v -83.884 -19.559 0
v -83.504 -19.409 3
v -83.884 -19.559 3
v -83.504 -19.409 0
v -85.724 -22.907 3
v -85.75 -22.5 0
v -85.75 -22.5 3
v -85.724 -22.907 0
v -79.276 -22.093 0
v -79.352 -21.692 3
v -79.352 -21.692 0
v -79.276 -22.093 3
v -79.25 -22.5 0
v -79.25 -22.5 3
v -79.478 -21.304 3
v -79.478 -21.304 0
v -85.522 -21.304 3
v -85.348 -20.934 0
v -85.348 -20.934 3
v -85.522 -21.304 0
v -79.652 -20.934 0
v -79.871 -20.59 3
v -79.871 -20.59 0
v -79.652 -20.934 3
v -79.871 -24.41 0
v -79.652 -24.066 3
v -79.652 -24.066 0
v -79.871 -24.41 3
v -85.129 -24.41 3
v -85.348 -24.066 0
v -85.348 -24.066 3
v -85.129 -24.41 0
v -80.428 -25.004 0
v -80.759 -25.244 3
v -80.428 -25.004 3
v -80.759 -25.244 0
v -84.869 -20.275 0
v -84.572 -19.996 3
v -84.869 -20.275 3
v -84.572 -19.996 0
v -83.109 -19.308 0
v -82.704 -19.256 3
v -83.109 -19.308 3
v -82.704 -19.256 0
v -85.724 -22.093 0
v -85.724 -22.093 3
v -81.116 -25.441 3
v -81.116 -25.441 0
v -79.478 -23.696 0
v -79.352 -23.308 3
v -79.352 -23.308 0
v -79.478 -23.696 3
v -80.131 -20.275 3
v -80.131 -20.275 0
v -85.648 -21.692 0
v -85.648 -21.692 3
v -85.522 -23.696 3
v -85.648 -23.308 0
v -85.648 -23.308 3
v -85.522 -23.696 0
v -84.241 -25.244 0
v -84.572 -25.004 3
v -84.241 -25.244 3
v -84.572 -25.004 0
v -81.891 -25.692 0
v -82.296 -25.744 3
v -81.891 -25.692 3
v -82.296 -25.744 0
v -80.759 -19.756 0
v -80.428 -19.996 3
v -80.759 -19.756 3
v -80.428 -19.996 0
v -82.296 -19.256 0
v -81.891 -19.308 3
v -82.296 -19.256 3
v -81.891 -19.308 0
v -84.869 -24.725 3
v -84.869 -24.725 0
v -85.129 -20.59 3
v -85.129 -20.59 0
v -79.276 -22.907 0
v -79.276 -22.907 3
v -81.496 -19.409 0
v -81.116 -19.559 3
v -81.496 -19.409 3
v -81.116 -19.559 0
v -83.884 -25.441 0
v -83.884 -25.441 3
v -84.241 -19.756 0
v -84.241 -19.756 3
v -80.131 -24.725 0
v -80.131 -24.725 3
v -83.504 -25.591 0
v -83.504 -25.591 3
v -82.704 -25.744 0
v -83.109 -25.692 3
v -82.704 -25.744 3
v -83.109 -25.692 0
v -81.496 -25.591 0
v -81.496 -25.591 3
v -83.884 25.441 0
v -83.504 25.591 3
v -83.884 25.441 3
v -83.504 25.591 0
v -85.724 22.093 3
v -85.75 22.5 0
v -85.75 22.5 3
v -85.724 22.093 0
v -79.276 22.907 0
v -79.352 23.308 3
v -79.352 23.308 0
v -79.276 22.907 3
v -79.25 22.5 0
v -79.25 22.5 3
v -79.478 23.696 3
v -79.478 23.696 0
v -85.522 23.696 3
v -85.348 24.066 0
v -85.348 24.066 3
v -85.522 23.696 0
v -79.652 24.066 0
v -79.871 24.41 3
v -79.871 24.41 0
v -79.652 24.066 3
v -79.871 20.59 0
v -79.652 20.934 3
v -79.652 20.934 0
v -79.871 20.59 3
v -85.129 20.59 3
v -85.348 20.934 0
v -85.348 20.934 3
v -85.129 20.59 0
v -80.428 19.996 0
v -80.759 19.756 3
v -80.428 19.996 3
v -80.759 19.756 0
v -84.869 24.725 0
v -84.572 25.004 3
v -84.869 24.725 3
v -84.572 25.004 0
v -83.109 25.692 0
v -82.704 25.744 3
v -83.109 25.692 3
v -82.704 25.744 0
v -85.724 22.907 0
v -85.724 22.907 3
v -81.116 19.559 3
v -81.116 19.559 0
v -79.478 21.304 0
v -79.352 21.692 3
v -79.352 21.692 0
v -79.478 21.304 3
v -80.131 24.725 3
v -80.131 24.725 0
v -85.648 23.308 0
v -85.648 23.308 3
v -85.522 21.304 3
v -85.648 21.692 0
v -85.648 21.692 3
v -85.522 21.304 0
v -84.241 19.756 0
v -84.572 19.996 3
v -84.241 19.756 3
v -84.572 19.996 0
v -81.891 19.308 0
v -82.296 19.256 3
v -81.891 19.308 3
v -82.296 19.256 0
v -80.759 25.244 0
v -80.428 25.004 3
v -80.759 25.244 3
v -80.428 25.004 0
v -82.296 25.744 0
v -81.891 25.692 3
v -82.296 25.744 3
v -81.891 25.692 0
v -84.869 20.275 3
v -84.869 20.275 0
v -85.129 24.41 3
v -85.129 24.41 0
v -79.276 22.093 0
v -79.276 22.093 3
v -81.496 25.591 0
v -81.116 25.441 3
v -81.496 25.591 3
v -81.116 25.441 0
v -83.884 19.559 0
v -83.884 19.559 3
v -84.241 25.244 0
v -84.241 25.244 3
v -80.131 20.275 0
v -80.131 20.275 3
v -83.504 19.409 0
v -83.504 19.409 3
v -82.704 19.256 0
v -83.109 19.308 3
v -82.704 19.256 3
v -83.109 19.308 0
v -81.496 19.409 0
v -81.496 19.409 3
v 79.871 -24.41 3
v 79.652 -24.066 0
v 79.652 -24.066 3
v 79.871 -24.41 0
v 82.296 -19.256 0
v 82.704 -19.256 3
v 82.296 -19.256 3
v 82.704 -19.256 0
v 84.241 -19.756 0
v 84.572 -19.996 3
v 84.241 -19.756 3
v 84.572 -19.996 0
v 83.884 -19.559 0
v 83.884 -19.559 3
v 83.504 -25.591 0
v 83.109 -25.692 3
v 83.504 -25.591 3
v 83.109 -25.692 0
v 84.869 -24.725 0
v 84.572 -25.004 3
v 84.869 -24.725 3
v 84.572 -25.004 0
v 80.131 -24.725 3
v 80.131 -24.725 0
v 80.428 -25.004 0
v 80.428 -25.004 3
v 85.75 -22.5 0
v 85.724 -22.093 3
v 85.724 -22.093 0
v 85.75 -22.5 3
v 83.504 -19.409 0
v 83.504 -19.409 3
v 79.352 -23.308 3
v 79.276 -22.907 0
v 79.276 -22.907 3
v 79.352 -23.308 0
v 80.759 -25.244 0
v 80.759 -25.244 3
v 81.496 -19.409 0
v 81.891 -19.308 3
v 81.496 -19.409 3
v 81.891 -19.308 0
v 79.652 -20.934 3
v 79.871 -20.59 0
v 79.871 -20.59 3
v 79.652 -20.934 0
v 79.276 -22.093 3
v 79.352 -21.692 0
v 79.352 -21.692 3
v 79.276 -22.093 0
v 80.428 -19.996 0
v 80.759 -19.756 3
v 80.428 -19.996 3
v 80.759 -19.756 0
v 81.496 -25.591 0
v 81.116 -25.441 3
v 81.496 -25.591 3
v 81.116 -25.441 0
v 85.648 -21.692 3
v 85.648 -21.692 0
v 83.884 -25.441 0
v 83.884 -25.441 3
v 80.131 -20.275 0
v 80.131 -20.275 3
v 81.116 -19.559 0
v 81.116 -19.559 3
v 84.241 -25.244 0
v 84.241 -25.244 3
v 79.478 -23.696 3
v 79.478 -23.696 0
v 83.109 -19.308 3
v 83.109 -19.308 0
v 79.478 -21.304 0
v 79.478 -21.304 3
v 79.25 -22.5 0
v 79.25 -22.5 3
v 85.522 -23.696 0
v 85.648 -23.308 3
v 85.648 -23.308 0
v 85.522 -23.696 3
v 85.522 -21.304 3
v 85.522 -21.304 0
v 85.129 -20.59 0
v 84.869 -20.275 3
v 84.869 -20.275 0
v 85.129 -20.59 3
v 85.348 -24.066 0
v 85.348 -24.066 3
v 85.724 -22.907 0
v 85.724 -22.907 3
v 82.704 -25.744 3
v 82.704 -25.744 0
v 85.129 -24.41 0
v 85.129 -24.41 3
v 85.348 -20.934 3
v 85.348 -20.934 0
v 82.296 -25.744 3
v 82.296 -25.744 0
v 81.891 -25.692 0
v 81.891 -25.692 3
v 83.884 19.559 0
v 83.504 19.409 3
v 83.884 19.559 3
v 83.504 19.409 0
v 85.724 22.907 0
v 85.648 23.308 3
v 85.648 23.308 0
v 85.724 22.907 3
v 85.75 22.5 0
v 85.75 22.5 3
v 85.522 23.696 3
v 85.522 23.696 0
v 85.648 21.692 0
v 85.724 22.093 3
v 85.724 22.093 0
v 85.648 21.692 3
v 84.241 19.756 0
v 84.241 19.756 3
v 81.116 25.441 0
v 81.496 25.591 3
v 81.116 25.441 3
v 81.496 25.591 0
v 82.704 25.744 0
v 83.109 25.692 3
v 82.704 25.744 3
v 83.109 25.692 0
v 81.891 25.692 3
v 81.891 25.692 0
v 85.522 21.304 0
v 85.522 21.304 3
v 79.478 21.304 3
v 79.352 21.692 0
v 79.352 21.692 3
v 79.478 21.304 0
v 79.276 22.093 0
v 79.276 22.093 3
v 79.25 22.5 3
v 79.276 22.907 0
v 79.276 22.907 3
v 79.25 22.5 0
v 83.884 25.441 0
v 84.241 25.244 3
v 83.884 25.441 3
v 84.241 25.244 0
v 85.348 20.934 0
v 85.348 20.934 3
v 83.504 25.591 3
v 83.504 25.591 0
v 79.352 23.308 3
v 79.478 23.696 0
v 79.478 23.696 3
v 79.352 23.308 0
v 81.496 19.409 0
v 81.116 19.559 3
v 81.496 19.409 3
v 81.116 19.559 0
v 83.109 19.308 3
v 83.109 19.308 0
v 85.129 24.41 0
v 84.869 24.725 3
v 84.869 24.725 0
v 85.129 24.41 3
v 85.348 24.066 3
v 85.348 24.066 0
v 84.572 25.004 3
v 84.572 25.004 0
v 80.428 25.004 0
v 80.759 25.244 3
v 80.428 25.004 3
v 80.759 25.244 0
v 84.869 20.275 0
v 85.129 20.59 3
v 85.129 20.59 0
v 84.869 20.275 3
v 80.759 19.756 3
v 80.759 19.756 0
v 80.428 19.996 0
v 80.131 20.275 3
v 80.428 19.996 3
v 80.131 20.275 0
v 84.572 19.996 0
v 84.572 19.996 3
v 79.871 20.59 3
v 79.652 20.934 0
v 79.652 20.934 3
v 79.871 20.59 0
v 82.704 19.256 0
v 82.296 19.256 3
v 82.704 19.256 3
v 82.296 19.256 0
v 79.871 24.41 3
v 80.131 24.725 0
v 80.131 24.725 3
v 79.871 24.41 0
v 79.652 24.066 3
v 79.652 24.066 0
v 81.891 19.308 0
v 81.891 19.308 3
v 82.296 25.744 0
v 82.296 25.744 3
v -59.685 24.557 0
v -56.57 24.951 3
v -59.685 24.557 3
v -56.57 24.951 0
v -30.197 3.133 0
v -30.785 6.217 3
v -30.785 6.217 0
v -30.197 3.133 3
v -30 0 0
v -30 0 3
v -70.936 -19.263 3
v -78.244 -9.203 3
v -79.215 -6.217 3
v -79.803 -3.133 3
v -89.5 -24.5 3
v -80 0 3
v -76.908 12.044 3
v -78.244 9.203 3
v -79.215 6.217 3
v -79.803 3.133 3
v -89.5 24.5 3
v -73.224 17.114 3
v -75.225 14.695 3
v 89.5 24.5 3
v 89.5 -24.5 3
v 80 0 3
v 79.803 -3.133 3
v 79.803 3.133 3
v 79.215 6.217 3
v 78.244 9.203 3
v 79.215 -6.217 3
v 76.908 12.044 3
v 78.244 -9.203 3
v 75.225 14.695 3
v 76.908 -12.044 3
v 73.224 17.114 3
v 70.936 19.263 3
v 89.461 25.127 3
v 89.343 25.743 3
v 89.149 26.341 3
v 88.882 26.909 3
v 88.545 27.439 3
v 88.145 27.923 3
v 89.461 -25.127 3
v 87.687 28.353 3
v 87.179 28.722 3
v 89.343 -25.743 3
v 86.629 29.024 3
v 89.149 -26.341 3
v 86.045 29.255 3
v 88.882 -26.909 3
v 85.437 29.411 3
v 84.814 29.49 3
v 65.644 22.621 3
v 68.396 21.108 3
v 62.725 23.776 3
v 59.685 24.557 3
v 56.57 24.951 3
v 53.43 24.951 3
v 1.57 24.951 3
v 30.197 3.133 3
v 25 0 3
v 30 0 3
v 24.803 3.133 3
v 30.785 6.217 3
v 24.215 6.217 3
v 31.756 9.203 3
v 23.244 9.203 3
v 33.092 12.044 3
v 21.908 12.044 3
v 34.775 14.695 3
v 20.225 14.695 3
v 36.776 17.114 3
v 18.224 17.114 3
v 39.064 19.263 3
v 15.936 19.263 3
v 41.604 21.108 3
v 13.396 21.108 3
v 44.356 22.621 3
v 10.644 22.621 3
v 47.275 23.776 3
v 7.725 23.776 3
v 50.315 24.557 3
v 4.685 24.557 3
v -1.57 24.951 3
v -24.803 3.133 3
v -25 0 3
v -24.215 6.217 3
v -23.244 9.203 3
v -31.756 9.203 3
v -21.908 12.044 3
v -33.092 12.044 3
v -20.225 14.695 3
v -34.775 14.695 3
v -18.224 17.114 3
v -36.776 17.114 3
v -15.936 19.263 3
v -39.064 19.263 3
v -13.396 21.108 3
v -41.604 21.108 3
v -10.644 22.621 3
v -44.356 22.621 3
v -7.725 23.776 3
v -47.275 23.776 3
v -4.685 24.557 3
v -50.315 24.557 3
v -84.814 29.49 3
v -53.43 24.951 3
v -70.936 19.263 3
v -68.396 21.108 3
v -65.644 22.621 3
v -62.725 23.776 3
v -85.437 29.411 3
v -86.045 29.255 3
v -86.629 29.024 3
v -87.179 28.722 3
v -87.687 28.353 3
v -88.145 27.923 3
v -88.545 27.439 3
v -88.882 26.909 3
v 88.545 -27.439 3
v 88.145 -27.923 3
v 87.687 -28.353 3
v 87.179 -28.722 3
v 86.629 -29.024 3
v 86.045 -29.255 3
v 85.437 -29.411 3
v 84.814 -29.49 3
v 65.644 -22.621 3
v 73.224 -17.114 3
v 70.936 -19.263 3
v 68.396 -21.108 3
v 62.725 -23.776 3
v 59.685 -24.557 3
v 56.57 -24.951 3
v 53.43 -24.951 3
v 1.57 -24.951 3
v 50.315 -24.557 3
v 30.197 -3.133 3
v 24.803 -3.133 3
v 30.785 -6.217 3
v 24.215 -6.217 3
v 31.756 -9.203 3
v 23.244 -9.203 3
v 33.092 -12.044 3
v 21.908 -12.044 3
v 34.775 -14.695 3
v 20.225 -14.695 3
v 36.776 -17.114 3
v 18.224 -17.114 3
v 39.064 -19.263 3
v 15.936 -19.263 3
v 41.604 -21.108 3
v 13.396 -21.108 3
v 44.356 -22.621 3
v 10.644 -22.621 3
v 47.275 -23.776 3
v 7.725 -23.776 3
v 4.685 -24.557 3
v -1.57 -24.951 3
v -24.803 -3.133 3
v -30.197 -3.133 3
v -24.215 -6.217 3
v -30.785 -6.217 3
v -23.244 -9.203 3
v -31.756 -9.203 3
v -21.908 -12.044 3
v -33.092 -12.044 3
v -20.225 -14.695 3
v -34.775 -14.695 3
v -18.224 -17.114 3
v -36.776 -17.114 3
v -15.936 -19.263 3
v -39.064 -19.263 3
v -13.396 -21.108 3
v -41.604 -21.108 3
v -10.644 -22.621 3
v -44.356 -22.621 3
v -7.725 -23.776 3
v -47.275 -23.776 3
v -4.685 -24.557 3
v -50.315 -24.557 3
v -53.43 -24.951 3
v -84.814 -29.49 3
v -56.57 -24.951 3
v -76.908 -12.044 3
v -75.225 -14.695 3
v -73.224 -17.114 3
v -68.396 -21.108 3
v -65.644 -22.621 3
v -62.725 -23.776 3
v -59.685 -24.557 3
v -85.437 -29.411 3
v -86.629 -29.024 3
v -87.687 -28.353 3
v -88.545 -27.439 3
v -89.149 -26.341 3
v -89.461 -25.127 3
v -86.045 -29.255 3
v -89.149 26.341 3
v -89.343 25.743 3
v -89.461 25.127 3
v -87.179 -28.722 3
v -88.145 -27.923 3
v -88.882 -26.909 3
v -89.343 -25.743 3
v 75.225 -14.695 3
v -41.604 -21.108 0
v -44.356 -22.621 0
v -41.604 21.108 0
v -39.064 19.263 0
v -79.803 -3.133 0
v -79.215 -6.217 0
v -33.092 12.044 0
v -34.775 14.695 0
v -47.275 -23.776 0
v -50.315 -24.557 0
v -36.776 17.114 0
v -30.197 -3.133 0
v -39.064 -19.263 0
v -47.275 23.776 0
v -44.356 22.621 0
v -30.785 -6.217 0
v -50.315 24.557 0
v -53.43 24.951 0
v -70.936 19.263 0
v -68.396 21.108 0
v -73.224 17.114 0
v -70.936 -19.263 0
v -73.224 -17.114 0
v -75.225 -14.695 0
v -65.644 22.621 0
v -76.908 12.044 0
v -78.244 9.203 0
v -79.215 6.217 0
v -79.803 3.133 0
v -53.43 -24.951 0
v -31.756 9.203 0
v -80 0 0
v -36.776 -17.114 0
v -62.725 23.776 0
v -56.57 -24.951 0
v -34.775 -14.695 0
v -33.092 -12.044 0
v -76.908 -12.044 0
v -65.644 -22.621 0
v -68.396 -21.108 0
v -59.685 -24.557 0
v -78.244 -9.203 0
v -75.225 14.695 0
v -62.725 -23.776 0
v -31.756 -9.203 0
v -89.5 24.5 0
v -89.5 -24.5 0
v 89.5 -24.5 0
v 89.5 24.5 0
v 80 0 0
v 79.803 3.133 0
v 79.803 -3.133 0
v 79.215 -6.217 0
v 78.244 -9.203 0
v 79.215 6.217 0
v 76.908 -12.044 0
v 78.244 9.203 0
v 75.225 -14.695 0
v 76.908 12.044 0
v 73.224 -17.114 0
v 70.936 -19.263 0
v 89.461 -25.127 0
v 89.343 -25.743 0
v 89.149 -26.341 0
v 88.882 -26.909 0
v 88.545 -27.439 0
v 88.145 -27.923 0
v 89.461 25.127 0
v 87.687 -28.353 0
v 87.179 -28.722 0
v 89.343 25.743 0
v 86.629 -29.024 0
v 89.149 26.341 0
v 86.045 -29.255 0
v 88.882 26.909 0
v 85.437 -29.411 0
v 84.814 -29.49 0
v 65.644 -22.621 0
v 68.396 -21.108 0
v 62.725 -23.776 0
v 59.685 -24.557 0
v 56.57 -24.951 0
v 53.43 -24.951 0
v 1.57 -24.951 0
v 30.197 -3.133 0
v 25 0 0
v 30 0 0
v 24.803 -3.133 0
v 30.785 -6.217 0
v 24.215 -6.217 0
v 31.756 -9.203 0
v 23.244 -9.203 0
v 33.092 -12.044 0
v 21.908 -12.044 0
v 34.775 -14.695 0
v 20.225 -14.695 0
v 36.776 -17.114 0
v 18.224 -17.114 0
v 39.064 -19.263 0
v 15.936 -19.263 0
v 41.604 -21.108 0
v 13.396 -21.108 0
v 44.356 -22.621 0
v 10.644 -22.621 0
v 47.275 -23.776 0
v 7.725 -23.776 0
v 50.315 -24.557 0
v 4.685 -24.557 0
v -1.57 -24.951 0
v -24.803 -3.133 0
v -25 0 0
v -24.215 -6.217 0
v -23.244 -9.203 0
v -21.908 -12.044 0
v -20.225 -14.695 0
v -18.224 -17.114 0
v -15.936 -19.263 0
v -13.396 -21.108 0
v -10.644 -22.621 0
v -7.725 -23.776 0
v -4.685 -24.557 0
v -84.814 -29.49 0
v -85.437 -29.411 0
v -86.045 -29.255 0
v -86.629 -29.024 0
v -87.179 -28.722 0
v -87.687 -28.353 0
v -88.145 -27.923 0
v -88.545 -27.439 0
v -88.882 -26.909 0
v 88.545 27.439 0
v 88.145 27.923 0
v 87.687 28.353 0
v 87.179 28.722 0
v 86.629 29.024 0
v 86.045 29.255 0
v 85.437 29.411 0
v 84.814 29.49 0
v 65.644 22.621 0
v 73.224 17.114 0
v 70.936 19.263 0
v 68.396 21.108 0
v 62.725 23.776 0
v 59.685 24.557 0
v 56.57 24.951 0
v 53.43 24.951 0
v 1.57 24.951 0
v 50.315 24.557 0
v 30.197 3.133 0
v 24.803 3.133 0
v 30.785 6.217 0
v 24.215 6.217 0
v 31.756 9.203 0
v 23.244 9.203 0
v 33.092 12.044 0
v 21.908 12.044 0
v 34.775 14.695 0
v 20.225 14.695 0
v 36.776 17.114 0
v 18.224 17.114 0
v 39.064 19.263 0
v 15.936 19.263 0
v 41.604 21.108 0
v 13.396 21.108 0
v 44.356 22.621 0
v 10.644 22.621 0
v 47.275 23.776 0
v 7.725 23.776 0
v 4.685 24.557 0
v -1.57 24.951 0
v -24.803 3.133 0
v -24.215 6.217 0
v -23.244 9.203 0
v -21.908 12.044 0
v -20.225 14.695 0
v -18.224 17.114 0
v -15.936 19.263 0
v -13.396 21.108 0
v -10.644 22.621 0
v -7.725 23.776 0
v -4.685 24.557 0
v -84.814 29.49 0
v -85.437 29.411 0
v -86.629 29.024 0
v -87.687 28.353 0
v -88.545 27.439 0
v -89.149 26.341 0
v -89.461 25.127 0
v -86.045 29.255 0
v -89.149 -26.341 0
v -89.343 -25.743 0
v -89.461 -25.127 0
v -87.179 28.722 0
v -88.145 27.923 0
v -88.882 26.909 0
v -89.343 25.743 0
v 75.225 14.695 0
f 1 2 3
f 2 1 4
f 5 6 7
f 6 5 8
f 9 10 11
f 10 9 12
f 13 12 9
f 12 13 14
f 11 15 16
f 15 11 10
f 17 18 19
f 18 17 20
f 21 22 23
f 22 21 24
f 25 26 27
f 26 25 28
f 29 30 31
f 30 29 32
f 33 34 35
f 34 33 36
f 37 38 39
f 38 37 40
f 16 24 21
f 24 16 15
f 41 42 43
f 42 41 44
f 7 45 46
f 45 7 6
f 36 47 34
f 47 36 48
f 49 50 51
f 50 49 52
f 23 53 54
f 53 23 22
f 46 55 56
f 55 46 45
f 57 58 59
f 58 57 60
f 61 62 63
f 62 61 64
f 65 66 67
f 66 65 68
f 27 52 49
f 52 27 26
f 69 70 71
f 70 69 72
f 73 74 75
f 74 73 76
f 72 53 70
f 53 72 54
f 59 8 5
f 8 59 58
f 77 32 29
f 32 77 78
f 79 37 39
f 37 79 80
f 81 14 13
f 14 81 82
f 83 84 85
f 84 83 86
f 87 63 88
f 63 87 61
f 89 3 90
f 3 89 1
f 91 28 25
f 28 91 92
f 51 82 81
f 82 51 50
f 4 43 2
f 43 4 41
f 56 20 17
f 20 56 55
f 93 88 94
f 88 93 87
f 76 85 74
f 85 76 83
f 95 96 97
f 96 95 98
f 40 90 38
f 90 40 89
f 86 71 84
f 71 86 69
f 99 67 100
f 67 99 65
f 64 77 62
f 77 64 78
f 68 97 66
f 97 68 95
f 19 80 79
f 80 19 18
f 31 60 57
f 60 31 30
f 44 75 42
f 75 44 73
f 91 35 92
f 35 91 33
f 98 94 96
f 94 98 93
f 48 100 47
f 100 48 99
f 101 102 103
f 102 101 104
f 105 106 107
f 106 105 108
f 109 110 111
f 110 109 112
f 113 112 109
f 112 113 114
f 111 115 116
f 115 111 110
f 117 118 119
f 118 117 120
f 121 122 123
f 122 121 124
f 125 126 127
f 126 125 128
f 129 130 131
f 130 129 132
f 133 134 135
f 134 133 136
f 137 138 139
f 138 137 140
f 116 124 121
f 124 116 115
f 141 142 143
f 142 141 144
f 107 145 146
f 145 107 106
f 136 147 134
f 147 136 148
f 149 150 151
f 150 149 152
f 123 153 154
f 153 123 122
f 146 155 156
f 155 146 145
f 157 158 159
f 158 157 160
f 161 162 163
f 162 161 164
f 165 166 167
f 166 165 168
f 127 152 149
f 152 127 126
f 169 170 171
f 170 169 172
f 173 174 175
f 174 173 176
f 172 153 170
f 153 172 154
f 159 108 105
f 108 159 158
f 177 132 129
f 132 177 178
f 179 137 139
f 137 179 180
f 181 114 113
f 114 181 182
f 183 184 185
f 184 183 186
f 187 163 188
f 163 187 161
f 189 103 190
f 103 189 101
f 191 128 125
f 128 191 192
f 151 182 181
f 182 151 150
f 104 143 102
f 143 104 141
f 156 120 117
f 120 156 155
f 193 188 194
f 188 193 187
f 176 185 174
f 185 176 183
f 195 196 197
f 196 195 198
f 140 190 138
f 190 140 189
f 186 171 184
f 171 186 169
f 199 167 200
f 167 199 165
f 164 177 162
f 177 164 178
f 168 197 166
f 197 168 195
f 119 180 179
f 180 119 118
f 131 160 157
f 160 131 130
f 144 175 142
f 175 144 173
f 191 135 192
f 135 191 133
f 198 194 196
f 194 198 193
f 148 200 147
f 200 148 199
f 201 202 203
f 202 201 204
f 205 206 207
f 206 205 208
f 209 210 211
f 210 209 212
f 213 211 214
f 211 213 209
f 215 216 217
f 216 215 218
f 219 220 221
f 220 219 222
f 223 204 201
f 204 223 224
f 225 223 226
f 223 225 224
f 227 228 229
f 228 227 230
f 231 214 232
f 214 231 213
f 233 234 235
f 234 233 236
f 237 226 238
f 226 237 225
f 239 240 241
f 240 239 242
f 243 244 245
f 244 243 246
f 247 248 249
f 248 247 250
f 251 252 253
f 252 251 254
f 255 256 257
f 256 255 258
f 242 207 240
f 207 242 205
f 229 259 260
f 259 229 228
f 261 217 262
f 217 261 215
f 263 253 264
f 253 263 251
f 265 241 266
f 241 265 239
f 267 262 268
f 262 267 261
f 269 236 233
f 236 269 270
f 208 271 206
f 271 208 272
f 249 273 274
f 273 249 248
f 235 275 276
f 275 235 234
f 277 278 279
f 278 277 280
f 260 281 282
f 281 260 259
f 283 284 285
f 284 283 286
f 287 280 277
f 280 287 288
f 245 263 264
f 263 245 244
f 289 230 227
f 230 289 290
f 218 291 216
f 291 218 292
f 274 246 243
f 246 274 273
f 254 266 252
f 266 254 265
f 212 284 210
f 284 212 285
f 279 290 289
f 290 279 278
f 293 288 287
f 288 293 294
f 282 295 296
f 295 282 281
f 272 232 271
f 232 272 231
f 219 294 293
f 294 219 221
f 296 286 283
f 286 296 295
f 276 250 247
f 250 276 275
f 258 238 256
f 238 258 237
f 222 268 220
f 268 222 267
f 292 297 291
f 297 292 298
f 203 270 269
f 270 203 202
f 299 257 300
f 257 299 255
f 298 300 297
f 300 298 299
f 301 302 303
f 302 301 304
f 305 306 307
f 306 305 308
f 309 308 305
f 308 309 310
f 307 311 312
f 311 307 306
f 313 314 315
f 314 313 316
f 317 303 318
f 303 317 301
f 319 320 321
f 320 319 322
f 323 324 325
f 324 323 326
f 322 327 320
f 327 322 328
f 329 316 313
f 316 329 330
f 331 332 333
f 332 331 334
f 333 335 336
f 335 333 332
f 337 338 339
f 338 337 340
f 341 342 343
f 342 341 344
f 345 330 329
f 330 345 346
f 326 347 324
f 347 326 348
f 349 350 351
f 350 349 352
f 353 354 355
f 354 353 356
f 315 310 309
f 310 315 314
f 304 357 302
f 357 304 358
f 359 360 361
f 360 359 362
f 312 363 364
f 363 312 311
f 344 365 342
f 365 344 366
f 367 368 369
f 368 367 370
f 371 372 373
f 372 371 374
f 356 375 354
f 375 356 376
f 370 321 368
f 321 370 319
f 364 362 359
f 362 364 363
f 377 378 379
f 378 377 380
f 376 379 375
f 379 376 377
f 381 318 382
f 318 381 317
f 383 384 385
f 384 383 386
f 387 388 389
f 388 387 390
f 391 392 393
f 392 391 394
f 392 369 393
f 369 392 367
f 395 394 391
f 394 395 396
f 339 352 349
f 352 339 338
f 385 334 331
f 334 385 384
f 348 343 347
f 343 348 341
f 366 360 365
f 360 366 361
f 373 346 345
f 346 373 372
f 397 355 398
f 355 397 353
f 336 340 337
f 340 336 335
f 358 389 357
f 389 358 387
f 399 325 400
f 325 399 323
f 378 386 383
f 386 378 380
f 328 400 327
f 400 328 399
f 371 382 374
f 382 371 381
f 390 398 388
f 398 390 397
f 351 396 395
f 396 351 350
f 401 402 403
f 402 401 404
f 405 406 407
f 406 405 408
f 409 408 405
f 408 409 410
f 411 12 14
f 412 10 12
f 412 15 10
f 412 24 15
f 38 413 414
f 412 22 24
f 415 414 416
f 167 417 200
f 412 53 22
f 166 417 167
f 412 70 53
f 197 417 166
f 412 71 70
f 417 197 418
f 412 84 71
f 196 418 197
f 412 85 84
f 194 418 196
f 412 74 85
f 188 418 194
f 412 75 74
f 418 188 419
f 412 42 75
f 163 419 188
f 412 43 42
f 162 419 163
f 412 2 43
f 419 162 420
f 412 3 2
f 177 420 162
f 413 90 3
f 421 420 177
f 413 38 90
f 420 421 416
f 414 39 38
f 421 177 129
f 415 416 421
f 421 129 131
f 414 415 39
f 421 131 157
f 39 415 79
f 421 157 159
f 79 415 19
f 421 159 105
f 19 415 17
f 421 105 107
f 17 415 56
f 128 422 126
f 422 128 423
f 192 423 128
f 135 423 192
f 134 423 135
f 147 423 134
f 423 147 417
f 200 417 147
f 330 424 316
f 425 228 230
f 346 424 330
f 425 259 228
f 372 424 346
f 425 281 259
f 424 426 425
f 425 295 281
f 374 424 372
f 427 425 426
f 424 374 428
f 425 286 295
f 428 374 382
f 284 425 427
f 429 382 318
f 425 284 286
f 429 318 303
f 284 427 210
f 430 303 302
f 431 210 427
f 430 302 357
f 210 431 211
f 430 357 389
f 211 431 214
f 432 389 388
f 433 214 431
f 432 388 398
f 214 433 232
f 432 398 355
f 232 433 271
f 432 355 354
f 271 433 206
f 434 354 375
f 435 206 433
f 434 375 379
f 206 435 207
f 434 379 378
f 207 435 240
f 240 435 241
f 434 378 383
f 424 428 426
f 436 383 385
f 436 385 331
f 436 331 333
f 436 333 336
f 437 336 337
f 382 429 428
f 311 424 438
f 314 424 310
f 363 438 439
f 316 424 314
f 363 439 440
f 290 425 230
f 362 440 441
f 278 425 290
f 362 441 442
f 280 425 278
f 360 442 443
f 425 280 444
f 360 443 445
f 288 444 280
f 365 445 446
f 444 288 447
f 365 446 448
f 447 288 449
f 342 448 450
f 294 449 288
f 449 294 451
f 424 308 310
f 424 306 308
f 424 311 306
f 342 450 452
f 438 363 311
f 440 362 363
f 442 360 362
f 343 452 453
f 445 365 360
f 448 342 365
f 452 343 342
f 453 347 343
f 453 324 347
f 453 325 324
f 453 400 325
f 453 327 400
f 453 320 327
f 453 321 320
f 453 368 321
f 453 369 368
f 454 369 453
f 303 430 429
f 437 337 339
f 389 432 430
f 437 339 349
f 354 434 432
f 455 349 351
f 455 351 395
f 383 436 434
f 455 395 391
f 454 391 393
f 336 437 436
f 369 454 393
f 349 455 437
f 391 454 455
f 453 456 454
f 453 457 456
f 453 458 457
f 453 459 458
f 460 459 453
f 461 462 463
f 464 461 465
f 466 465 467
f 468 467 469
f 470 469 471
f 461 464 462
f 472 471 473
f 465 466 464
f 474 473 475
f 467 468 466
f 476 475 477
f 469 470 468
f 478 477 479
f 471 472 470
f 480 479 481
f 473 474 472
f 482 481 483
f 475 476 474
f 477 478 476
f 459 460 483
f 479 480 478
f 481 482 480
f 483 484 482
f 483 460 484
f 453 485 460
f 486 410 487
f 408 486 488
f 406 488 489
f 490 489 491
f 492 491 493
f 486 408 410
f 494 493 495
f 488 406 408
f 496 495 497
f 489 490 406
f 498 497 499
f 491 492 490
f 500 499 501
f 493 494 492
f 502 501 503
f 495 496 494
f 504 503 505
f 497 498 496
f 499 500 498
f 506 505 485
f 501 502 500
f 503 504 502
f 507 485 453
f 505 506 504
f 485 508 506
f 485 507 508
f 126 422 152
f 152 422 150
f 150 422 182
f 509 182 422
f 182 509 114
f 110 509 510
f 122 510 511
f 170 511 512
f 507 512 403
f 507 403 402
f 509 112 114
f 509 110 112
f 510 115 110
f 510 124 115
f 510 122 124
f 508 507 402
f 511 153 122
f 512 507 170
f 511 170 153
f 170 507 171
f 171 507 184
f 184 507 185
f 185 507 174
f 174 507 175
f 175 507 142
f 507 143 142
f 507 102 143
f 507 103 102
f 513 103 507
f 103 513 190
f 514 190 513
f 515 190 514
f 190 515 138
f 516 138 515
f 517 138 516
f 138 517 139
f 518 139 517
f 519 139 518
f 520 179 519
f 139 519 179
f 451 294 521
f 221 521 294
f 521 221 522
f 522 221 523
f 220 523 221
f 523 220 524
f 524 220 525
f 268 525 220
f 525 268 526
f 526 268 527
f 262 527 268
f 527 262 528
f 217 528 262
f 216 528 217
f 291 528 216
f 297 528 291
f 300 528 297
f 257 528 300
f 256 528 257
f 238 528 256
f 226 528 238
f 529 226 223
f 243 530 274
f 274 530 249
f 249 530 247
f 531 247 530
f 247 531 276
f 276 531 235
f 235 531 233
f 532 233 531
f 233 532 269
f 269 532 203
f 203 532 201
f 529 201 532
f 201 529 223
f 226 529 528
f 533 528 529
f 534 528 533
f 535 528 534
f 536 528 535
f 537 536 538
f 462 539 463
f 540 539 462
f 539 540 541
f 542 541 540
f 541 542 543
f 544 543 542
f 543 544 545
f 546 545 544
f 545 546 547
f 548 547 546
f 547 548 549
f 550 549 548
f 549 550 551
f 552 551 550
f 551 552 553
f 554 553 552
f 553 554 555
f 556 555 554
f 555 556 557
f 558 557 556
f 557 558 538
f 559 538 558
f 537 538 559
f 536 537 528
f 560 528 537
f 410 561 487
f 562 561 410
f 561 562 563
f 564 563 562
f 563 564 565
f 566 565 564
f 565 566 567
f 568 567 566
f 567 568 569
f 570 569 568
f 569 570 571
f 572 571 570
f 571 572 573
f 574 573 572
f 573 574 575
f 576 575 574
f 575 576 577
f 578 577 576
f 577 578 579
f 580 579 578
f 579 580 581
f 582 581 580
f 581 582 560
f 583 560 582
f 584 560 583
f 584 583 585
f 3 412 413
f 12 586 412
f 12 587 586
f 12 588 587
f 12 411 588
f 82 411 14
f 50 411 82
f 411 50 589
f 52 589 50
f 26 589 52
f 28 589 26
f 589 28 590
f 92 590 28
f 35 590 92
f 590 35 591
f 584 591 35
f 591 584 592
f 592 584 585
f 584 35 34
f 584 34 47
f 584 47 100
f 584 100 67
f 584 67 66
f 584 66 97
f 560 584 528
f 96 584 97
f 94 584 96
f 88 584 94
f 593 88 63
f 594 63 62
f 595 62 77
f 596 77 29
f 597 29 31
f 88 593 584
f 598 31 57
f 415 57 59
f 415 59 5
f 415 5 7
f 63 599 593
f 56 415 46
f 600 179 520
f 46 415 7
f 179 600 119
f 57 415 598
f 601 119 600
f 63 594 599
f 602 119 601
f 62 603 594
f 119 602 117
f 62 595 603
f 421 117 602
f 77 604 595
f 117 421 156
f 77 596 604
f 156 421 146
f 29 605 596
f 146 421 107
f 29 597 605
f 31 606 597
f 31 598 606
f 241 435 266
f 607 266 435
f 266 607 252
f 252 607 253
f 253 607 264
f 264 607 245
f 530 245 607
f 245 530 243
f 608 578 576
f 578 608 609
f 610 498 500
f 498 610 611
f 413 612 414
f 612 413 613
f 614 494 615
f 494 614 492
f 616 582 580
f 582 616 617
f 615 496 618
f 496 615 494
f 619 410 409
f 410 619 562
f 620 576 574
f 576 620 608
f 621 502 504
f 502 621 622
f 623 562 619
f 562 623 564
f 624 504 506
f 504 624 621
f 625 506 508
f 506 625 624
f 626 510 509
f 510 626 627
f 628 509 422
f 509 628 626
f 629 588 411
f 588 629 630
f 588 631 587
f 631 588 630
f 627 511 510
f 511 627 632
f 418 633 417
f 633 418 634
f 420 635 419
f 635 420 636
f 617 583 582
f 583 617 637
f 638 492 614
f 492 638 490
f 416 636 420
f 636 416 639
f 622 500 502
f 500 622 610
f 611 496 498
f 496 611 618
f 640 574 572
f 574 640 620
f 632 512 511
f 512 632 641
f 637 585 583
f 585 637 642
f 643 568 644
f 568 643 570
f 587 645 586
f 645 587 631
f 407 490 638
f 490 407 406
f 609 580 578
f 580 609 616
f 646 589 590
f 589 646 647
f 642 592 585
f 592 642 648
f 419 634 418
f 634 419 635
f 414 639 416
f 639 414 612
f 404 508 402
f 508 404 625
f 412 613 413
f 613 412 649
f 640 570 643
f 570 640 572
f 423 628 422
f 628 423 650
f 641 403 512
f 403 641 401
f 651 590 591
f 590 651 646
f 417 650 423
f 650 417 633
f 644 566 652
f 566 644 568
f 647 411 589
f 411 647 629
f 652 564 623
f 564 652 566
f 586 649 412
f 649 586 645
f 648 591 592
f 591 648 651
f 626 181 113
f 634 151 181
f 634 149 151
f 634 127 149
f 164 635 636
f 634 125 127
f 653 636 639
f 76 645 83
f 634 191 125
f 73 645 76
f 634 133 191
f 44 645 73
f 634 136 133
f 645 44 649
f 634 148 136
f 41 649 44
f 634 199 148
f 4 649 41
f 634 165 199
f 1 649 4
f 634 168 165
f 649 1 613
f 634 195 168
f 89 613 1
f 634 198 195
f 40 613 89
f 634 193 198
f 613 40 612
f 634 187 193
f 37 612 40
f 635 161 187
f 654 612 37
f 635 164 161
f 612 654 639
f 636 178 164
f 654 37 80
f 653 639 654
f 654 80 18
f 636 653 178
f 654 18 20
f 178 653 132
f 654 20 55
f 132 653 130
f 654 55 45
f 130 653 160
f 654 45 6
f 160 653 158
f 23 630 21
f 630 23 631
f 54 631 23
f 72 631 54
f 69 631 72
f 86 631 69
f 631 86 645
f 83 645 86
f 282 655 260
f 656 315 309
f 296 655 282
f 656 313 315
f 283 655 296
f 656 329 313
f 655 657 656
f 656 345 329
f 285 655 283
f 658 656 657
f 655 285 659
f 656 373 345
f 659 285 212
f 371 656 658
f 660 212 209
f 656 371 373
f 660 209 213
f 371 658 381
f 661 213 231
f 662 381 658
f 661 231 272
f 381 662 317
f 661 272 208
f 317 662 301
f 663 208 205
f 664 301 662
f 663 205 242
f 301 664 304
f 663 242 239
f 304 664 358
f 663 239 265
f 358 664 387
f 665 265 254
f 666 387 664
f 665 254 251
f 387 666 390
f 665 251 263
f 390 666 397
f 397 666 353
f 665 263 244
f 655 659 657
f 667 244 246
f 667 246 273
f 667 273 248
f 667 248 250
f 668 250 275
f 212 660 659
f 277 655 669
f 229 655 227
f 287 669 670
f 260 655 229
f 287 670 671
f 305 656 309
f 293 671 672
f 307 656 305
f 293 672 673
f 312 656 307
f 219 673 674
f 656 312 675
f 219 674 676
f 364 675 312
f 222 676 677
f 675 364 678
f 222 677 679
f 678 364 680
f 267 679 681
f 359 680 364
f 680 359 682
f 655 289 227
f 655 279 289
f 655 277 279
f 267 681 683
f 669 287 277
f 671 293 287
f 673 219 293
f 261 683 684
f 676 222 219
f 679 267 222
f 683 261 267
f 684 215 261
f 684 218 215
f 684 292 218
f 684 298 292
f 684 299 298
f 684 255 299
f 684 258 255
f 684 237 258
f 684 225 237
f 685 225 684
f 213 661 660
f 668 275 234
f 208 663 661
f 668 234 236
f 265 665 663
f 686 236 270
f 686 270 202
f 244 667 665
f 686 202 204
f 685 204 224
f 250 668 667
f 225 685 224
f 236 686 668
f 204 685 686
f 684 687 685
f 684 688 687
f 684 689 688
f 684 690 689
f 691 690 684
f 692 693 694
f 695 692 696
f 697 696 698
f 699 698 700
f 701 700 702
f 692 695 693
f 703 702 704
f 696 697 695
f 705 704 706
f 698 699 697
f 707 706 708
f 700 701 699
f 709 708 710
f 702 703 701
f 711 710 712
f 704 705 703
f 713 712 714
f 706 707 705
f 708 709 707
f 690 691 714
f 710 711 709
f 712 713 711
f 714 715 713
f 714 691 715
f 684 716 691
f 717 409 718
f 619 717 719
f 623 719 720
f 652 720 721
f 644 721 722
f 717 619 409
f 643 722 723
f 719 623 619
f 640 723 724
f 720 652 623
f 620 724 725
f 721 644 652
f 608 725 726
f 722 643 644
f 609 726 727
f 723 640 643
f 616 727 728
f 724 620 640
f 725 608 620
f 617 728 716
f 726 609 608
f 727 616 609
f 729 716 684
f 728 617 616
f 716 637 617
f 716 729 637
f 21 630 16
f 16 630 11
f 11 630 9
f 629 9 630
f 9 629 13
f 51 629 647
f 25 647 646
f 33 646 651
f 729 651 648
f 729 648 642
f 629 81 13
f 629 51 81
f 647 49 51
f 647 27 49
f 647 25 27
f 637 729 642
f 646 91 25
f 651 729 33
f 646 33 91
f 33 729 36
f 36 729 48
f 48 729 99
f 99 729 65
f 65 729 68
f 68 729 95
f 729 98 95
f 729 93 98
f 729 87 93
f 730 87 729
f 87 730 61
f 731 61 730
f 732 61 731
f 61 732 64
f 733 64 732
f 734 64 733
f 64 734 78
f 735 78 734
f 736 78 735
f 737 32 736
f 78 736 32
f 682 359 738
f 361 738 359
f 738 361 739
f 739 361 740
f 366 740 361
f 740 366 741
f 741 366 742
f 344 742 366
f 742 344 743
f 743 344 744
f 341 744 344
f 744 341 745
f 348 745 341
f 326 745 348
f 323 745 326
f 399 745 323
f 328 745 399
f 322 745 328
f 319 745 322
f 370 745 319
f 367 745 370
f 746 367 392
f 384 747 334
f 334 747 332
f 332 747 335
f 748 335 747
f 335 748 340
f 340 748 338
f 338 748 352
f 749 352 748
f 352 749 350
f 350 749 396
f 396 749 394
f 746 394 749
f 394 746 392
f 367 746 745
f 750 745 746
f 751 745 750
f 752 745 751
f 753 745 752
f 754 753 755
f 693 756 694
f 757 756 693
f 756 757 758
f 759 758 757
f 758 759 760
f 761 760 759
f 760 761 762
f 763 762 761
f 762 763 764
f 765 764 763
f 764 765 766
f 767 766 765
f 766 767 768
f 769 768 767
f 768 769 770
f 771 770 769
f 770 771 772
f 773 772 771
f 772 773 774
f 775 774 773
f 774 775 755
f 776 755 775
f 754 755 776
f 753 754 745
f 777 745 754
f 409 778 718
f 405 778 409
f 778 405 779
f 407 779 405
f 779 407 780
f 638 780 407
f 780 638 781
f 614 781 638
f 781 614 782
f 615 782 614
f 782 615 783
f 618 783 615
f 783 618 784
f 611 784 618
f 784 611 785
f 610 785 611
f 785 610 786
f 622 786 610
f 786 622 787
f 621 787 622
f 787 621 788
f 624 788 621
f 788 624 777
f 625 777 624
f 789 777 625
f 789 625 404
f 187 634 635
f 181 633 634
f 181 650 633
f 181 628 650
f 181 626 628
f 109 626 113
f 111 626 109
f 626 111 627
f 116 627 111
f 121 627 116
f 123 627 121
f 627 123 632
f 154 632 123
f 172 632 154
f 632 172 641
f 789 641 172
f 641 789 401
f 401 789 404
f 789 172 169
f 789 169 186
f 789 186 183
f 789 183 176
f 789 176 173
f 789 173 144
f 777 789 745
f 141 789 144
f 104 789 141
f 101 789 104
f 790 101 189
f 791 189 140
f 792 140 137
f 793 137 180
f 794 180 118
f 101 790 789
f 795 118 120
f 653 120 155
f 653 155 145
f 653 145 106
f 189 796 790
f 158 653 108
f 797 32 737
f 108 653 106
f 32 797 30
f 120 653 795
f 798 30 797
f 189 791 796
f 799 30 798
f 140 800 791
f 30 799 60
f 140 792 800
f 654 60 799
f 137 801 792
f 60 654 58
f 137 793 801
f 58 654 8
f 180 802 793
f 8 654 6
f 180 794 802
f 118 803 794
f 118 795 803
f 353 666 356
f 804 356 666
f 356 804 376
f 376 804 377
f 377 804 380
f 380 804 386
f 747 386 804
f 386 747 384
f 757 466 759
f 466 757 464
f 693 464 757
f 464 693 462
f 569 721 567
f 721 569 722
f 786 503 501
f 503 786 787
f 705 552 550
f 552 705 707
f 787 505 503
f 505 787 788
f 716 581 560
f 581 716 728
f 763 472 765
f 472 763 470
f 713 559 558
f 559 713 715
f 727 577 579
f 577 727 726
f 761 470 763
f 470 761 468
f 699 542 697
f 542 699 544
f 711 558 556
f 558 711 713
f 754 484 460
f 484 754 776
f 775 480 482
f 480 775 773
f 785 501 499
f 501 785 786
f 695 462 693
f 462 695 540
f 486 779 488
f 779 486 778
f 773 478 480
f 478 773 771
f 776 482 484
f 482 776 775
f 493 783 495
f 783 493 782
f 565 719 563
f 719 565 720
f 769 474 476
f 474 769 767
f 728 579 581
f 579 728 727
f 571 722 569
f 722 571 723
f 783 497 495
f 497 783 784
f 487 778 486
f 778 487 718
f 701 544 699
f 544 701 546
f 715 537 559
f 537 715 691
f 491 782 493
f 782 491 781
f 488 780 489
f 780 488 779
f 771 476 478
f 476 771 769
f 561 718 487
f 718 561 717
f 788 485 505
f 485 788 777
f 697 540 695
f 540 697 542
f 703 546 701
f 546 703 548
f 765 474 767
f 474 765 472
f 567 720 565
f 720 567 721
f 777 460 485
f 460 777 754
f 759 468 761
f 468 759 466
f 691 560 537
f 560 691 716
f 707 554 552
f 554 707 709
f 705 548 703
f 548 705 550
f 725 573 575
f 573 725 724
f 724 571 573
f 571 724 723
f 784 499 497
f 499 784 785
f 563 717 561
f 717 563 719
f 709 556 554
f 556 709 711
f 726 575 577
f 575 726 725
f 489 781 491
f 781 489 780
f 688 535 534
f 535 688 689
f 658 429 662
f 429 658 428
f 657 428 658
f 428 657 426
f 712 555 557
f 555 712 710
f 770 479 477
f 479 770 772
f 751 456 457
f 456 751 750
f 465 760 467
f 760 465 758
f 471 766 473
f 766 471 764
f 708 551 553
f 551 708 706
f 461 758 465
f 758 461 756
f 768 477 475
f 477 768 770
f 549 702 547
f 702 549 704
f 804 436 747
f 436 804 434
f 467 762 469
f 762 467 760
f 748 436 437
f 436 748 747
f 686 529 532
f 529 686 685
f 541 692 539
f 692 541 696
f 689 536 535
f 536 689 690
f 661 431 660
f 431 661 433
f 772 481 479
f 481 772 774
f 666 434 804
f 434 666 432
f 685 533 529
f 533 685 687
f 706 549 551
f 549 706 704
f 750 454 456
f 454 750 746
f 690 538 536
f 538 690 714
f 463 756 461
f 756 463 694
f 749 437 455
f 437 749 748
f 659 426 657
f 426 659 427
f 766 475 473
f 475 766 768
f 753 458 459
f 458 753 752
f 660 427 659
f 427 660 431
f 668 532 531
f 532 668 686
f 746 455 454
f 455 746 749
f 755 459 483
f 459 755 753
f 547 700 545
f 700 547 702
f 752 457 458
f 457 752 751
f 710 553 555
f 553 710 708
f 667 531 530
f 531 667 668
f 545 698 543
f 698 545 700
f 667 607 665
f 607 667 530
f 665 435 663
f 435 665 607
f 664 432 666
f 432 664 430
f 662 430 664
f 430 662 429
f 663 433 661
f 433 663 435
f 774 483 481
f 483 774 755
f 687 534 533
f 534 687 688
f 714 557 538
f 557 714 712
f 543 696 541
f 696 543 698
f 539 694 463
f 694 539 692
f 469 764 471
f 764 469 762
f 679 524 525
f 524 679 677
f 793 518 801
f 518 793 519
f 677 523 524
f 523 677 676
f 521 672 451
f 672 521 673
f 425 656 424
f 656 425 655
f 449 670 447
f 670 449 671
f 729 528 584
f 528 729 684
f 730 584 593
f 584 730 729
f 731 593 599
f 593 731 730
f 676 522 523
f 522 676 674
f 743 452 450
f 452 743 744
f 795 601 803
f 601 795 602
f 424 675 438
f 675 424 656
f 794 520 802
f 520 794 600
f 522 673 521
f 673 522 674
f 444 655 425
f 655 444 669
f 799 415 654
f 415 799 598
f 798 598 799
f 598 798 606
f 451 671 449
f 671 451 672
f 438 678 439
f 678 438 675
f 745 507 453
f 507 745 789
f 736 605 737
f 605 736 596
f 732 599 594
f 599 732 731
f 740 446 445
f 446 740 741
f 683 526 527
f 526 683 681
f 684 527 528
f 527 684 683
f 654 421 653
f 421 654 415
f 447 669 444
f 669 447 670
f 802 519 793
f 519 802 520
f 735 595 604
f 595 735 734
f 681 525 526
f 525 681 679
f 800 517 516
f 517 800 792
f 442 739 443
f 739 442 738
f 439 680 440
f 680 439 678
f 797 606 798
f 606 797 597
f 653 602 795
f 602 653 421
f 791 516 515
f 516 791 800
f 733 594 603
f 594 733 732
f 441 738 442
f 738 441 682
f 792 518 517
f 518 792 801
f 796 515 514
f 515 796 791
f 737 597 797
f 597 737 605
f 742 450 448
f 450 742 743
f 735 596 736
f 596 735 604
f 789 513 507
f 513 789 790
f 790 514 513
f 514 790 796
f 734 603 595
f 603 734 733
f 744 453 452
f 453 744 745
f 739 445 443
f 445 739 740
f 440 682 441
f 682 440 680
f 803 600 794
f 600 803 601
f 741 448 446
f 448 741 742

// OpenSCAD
$fn = 50;


difference() {
	union() {
		hull() {
			translate(v = [-84.5000000000, 24.5000000000, 0]) {
				cylinder(h = 3, r = 5);
			}
			translate(v = [84.5000000000, 24.5000000000, 0]) {
				cylinder(h = 3, r = 5);
			}
			translate(v = [-84.5000000000, -24.5000000000, 0]) {
				cylinder(h = 3, r = 5);
			}
			translate(v = [84.5000000000, -24.5000000000, 0]) {
				cylinder(h = 3, r = 5);
			}
		}
	}
	union() {
		#translate(v = [-82.5000000000, -22.5000000000, -100.0000000000]) {
			cylinder(h = 200, r = 3.2500000000);
		}
		#translate(v = [-82.5000000000, 22.5000000000, -100.0000000000]) {
			cylinder(h = 200, r = 3.2500000000);
		}
		#translate(v = [82.5000000000, -22.5000000000, -100.0000000000]) {
			cylinder(h = 200, r = 3.2500000000);
		}
		#translate(v = [82.5000000000, 22.5000000000, -100.0000000000]) {
			cylinder(h = 200, r = 3.2500000000);
		}
		#translate(v = [-55.0000000000, 0, 0]) {
			cylinder(h = 3, r = 25.0000000000);
		}
		#cylinder(h = 3, r = 25.0000000000);
		#translate(v = [55.0000000000, 0, 0]) {
			cylinder(h = 3, r = 25.0000000000);
		}
	}
}
